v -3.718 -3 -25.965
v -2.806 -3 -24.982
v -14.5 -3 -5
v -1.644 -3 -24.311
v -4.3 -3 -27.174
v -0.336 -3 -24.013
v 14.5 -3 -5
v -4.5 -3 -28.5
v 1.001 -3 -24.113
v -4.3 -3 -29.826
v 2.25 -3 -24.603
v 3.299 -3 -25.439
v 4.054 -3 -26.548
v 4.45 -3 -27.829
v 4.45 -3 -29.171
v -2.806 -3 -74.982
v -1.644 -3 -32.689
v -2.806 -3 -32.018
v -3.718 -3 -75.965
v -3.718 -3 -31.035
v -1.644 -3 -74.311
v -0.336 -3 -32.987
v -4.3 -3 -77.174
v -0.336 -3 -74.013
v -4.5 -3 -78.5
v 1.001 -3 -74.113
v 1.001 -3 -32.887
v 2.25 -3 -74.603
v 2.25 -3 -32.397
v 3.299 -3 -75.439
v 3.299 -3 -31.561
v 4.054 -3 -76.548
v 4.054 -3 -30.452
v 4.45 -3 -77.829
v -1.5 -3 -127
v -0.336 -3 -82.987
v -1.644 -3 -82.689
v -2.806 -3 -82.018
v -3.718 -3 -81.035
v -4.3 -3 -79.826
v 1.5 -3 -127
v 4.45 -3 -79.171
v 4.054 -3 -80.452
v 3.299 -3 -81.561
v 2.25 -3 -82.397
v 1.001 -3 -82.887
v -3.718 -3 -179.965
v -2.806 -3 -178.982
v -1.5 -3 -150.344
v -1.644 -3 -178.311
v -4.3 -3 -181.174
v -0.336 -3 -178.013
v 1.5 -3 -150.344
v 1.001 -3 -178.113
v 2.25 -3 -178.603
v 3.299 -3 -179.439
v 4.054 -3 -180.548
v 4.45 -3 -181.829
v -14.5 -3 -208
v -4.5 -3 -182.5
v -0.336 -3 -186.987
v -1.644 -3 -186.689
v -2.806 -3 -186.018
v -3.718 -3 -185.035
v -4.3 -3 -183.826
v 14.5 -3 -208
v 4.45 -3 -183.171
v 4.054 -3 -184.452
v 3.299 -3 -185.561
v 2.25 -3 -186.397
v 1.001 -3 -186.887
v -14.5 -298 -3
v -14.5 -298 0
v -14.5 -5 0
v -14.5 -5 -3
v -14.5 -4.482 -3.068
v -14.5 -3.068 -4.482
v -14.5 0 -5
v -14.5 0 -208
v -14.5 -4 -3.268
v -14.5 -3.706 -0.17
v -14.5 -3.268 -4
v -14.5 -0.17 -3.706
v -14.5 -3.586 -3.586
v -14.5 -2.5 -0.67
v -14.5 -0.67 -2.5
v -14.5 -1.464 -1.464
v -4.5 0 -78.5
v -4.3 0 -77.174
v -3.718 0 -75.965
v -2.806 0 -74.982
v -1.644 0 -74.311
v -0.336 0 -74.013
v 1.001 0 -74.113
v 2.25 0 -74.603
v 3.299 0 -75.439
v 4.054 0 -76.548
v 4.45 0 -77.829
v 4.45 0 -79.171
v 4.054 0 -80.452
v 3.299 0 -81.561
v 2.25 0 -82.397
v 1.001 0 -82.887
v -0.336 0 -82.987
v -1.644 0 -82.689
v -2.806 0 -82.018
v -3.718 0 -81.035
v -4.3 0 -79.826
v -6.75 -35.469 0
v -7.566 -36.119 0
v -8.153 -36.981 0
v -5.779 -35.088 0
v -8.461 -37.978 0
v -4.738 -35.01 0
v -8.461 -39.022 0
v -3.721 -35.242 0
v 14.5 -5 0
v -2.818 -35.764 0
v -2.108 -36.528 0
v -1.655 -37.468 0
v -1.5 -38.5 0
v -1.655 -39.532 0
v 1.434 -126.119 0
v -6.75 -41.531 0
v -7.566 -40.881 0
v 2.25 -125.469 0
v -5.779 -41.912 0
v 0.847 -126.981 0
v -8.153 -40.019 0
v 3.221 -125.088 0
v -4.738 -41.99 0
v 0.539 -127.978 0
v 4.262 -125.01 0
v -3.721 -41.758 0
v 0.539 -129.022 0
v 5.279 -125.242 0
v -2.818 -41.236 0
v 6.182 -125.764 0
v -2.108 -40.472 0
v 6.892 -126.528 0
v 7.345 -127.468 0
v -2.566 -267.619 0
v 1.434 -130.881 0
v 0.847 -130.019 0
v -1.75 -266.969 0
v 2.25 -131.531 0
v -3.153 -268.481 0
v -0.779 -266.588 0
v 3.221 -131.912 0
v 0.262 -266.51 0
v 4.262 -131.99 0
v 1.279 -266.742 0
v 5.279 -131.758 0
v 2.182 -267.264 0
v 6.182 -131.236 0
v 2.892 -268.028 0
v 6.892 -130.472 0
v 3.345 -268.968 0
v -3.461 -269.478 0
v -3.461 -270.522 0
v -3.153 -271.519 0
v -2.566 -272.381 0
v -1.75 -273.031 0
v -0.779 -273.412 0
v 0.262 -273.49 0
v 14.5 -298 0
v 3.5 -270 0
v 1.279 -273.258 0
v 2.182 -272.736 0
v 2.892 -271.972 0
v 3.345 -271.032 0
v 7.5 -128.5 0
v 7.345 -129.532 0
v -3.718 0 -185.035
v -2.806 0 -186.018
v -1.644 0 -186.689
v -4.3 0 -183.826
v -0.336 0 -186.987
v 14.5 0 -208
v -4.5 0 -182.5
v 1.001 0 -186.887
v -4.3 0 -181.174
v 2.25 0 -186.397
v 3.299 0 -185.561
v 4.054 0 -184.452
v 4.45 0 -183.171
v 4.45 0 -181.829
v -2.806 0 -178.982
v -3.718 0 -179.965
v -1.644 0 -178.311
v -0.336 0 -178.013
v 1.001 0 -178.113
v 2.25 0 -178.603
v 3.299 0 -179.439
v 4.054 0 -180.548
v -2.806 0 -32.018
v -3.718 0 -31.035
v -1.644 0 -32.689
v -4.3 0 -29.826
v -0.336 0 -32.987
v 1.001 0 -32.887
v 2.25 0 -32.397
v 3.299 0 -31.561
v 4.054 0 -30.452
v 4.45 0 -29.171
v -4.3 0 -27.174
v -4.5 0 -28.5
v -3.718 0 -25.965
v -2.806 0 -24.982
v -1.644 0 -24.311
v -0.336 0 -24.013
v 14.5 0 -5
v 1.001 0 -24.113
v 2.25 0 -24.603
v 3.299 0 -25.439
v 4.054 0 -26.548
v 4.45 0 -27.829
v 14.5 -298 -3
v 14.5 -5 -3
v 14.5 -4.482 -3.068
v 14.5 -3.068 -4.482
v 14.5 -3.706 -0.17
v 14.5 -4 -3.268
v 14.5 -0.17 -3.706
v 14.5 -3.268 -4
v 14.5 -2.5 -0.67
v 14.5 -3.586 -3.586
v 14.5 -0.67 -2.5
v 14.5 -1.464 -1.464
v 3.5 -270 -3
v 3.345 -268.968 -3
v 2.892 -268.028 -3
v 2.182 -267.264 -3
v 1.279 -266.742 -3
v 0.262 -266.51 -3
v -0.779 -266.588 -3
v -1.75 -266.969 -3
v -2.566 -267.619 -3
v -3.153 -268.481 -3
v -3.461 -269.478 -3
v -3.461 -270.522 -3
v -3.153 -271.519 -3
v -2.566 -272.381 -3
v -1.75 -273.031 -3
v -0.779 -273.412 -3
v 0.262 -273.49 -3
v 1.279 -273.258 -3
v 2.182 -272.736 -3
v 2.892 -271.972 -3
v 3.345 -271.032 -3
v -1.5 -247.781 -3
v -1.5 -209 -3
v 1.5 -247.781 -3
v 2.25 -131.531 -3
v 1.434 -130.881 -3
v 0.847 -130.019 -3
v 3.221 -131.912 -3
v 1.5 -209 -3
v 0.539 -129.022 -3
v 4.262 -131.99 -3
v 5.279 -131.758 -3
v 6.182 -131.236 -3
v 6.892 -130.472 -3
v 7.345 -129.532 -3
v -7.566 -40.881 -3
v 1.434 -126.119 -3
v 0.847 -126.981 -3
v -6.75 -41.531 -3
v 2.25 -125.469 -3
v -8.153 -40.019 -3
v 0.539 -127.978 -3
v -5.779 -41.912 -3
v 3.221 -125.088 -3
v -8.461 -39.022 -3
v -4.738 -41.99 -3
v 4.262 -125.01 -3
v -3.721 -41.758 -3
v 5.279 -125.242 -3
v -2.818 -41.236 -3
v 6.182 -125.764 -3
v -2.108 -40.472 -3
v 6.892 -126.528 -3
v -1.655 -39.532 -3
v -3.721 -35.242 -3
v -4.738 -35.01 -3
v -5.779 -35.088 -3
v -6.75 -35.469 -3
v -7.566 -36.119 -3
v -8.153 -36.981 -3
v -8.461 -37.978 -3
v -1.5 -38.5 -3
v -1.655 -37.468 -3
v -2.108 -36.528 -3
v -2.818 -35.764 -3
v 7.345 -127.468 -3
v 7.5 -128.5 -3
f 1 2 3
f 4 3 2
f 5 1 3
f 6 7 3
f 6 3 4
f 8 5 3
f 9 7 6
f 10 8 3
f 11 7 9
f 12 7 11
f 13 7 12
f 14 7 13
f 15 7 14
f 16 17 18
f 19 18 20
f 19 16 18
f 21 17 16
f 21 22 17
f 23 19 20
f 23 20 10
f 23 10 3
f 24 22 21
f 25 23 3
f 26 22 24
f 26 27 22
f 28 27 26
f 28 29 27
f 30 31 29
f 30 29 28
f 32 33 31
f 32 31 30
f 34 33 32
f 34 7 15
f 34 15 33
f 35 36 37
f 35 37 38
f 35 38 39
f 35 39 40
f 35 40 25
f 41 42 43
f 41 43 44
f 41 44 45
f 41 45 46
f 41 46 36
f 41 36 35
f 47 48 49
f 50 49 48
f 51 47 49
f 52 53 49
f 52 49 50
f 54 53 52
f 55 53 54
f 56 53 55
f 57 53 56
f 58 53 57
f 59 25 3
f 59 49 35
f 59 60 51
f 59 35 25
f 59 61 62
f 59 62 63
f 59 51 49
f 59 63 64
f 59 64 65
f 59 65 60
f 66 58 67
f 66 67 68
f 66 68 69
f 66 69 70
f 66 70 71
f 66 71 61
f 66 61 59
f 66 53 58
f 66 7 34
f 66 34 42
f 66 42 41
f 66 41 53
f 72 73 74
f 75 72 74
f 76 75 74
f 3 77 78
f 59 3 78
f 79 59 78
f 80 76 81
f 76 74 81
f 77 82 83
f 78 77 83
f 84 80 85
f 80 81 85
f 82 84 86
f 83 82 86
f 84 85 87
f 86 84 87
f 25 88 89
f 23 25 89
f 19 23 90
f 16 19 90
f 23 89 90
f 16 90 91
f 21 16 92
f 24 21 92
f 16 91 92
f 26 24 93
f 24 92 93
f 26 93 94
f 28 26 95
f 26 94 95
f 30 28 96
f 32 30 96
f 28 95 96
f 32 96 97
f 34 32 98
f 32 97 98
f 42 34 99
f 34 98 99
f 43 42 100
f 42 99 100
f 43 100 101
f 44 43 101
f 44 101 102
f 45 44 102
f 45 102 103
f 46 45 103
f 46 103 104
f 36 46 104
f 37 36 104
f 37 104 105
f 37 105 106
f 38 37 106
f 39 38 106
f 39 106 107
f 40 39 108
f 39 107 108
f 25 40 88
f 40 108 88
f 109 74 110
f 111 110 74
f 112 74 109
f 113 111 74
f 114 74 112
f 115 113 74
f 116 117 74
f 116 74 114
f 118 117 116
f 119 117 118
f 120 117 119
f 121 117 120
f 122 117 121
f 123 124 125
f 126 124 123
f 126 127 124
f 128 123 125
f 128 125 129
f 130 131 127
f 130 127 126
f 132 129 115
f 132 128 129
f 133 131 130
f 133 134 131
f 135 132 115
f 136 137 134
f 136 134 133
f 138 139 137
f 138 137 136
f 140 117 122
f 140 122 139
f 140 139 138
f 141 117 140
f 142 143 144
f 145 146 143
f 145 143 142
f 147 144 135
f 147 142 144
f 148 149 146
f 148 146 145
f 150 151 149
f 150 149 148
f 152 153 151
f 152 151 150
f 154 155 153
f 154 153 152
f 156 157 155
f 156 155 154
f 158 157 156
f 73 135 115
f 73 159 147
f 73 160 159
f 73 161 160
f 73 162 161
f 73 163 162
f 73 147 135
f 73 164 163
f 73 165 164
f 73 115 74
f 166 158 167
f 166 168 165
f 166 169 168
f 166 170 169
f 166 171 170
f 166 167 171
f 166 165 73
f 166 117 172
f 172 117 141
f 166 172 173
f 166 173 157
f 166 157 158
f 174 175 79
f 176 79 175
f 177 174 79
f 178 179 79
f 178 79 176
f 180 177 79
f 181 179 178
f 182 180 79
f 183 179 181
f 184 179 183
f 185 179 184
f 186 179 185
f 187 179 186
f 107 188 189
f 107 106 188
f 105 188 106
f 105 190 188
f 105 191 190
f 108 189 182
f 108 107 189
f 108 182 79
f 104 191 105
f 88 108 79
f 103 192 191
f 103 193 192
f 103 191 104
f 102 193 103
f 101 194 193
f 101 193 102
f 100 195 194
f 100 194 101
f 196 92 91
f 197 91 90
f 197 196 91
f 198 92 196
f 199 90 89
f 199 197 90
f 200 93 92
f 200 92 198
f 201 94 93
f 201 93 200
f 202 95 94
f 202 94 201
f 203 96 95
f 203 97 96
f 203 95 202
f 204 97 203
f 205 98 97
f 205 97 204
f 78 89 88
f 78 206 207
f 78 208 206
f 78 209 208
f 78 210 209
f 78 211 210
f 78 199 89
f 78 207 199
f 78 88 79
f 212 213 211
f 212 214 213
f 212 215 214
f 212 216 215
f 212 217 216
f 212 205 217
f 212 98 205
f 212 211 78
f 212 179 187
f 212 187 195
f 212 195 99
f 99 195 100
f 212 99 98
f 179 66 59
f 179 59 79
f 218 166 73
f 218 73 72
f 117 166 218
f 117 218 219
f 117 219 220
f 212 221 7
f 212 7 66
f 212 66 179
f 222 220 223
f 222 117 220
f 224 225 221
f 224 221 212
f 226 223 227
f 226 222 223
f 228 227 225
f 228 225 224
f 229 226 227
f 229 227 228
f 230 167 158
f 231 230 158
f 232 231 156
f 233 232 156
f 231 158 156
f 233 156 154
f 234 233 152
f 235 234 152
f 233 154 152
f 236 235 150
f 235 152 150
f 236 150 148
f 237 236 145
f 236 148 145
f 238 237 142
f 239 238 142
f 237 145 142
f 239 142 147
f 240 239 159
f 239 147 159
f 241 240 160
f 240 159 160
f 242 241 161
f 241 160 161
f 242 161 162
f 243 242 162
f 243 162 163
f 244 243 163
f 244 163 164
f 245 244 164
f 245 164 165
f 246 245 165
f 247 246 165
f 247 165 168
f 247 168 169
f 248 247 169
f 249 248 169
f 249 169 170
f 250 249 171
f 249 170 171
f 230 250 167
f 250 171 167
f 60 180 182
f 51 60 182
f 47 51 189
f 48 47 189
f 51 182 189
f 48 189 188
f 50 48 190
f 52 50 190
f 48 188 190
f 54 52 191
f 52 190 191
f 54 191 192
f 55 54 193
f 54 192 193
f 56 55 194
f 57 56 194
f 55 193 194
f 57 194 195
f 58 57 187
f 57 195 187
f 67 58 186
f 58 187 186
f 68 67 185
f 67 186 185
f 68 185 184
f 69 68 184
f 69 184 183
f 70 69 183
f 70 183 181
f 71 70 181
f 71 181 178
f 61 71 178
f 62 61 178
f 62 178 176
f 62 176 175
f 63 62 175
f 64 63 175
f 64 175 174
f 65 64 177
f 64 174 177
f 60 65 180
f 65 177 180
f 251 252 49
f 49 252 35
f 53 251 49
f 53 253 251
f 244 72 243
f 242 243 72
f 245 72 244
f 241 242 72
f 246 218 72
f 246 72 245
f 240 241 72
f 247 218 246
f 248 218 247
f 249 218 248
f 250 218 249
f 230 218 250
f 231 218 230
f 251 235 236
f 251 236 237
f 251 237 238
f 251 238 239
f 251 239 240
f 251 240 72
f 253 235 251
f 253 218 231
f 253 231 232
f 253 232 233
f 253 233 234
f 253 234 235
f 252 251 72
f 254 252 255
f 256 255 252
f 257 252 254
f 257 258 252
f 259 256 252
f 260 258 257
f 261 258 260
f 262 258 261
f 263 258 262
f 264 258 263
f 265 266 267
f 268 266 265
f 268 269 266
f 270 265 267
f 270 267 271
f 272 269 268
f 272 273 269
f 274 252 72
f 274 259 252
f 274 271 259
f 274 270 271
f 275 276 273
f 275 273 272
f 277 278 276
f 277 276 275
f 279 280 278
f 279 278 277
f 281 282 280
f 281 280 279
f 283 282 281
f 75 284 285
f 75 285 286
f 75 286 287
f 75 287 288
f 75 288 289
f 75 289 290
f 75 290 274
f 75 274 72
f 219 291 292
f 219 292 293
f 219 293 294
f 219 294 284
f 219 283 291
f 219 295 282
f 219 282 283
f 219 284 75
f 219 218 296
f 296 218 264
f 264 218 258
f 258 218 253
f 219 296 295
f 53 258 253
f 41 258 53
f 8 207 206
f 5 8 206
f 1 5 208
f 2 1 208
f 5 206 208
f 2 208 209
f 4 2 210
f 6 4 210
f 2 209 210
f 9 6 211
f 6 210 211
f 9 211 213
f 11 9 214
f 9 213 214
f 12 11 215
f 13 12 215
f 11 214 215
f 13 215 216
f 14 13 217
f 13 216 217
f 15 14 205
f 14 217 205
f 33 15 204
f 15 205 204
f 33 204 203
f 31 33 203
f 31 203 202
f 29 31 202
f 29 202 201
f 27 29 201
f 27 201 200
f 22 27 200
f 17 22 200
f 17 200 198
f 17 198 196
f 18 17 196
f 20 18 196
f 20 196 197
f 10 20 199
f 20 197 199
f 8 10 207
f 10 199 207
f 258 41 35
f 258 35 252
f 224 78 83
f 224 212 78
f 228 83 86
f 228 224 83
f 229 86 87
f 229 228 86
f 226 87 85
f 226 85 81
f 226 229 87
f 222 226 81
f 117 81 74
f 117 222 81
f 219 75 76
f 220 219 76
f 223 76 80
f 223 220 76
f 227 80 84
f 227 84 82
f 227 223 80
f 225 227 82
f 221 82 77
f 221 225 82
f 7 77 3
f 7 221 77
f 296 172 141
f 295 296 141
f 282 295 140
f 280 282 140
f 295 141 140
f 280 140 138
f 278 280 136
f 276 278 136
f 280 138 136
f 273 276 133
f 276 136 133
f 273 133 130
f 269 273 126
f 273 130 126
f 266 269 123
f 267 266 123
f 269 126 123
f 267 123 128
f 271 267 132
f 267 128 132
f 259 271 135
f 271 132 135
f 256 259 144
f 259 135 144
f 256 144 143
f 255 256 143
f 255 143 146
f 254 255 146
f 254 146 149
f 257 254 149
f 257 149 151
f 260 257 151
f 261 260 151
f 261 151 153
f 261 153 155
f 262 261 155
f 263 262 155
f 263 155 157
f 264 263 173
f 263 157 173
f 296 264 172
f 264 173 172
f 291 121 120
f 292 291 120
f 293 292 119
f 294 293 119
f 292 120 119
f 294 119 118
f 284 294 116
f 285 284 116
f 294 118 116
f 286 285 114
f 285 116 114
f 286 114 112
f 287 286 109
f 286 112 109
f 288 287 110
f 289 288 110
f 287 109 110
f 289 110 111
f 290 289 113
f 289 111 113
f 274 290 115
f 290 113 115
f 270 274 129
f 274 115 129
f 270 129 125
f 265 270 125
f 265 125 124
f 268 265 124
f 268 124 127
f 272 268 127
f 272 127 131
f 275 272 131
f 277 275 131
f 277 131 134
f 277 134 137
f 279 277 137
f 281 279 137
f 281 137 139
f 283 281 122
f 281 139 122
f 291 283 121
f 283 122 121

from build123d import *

# Parameters (mm, degrees)
F1_DEPTH = 14.5
F3_DEPTH = 1.5
F4_R     = 4.5
F5_DEPTH = 3
F6_R     = 3.5
F7_DEPTH = 3


with BuildPart() as f1:
    # F0 (on Right) → F1 (new body, symmetric)
    with BuildSketch(Plane.YZ):
        with BuildLine():
            Line((-5, 0), (-298, 0))
            Line((-298, 0), (-298, -3))
            Line((-298, -3), (-5, -3))
            ThreePointArc((-5, -3), (-3.585786, -3.585786), (-3, -5))
            Line((-3, -5), (-3, -208))
            Line((-3, -208), (0, -208))
            Line((0, -208), (0, -5))
            ThreePointArc((0, -5), (-1.464466, -1.464466), (-5, 0))
        make_face()
    extrude(amount=F1_DEPTH, both=True)

    # F2 (on Right) → F3 (join, symmetric)
    with BuildSketch(Plane.YZ):
        Polygon((-3, -150.343812), (-3, -127), (-209, -3), (-247.780849, -3), align=None)
    extrude(amount=F3_DEPTH, both=True)

    # F4 (on face) → F5 (cut)
    with BuildSketch(Plane(origin=(0, 0, 0), x_dir=(-1, 0, 0), z_dir=(0, 1, 0))):
        with Locations((0, -28.5)):
            Circle(F4_R)
        with Locations((0, -78.5)):
            Circle(F4_R)
        with Locations((0, -182.5)):
            Circle(F4_R)
    extrude(amount=-F5_DEPTH, mode=Mode.SUBTRACT)

    # F6 (on face) → F7 (cut)
    with BuildSketch(Plane.XY):
        with Locations((-5, -38.5)):
            Circle(F6_R)
        with Locations((4, -128.5)):
            Circle(F6_R)
        with Locations((0, -270)):
            Circle(F6_R)
    extrude(amount=-F7_DEPTH, mode=Mode.SUBTRACT)


solid = f1.part
